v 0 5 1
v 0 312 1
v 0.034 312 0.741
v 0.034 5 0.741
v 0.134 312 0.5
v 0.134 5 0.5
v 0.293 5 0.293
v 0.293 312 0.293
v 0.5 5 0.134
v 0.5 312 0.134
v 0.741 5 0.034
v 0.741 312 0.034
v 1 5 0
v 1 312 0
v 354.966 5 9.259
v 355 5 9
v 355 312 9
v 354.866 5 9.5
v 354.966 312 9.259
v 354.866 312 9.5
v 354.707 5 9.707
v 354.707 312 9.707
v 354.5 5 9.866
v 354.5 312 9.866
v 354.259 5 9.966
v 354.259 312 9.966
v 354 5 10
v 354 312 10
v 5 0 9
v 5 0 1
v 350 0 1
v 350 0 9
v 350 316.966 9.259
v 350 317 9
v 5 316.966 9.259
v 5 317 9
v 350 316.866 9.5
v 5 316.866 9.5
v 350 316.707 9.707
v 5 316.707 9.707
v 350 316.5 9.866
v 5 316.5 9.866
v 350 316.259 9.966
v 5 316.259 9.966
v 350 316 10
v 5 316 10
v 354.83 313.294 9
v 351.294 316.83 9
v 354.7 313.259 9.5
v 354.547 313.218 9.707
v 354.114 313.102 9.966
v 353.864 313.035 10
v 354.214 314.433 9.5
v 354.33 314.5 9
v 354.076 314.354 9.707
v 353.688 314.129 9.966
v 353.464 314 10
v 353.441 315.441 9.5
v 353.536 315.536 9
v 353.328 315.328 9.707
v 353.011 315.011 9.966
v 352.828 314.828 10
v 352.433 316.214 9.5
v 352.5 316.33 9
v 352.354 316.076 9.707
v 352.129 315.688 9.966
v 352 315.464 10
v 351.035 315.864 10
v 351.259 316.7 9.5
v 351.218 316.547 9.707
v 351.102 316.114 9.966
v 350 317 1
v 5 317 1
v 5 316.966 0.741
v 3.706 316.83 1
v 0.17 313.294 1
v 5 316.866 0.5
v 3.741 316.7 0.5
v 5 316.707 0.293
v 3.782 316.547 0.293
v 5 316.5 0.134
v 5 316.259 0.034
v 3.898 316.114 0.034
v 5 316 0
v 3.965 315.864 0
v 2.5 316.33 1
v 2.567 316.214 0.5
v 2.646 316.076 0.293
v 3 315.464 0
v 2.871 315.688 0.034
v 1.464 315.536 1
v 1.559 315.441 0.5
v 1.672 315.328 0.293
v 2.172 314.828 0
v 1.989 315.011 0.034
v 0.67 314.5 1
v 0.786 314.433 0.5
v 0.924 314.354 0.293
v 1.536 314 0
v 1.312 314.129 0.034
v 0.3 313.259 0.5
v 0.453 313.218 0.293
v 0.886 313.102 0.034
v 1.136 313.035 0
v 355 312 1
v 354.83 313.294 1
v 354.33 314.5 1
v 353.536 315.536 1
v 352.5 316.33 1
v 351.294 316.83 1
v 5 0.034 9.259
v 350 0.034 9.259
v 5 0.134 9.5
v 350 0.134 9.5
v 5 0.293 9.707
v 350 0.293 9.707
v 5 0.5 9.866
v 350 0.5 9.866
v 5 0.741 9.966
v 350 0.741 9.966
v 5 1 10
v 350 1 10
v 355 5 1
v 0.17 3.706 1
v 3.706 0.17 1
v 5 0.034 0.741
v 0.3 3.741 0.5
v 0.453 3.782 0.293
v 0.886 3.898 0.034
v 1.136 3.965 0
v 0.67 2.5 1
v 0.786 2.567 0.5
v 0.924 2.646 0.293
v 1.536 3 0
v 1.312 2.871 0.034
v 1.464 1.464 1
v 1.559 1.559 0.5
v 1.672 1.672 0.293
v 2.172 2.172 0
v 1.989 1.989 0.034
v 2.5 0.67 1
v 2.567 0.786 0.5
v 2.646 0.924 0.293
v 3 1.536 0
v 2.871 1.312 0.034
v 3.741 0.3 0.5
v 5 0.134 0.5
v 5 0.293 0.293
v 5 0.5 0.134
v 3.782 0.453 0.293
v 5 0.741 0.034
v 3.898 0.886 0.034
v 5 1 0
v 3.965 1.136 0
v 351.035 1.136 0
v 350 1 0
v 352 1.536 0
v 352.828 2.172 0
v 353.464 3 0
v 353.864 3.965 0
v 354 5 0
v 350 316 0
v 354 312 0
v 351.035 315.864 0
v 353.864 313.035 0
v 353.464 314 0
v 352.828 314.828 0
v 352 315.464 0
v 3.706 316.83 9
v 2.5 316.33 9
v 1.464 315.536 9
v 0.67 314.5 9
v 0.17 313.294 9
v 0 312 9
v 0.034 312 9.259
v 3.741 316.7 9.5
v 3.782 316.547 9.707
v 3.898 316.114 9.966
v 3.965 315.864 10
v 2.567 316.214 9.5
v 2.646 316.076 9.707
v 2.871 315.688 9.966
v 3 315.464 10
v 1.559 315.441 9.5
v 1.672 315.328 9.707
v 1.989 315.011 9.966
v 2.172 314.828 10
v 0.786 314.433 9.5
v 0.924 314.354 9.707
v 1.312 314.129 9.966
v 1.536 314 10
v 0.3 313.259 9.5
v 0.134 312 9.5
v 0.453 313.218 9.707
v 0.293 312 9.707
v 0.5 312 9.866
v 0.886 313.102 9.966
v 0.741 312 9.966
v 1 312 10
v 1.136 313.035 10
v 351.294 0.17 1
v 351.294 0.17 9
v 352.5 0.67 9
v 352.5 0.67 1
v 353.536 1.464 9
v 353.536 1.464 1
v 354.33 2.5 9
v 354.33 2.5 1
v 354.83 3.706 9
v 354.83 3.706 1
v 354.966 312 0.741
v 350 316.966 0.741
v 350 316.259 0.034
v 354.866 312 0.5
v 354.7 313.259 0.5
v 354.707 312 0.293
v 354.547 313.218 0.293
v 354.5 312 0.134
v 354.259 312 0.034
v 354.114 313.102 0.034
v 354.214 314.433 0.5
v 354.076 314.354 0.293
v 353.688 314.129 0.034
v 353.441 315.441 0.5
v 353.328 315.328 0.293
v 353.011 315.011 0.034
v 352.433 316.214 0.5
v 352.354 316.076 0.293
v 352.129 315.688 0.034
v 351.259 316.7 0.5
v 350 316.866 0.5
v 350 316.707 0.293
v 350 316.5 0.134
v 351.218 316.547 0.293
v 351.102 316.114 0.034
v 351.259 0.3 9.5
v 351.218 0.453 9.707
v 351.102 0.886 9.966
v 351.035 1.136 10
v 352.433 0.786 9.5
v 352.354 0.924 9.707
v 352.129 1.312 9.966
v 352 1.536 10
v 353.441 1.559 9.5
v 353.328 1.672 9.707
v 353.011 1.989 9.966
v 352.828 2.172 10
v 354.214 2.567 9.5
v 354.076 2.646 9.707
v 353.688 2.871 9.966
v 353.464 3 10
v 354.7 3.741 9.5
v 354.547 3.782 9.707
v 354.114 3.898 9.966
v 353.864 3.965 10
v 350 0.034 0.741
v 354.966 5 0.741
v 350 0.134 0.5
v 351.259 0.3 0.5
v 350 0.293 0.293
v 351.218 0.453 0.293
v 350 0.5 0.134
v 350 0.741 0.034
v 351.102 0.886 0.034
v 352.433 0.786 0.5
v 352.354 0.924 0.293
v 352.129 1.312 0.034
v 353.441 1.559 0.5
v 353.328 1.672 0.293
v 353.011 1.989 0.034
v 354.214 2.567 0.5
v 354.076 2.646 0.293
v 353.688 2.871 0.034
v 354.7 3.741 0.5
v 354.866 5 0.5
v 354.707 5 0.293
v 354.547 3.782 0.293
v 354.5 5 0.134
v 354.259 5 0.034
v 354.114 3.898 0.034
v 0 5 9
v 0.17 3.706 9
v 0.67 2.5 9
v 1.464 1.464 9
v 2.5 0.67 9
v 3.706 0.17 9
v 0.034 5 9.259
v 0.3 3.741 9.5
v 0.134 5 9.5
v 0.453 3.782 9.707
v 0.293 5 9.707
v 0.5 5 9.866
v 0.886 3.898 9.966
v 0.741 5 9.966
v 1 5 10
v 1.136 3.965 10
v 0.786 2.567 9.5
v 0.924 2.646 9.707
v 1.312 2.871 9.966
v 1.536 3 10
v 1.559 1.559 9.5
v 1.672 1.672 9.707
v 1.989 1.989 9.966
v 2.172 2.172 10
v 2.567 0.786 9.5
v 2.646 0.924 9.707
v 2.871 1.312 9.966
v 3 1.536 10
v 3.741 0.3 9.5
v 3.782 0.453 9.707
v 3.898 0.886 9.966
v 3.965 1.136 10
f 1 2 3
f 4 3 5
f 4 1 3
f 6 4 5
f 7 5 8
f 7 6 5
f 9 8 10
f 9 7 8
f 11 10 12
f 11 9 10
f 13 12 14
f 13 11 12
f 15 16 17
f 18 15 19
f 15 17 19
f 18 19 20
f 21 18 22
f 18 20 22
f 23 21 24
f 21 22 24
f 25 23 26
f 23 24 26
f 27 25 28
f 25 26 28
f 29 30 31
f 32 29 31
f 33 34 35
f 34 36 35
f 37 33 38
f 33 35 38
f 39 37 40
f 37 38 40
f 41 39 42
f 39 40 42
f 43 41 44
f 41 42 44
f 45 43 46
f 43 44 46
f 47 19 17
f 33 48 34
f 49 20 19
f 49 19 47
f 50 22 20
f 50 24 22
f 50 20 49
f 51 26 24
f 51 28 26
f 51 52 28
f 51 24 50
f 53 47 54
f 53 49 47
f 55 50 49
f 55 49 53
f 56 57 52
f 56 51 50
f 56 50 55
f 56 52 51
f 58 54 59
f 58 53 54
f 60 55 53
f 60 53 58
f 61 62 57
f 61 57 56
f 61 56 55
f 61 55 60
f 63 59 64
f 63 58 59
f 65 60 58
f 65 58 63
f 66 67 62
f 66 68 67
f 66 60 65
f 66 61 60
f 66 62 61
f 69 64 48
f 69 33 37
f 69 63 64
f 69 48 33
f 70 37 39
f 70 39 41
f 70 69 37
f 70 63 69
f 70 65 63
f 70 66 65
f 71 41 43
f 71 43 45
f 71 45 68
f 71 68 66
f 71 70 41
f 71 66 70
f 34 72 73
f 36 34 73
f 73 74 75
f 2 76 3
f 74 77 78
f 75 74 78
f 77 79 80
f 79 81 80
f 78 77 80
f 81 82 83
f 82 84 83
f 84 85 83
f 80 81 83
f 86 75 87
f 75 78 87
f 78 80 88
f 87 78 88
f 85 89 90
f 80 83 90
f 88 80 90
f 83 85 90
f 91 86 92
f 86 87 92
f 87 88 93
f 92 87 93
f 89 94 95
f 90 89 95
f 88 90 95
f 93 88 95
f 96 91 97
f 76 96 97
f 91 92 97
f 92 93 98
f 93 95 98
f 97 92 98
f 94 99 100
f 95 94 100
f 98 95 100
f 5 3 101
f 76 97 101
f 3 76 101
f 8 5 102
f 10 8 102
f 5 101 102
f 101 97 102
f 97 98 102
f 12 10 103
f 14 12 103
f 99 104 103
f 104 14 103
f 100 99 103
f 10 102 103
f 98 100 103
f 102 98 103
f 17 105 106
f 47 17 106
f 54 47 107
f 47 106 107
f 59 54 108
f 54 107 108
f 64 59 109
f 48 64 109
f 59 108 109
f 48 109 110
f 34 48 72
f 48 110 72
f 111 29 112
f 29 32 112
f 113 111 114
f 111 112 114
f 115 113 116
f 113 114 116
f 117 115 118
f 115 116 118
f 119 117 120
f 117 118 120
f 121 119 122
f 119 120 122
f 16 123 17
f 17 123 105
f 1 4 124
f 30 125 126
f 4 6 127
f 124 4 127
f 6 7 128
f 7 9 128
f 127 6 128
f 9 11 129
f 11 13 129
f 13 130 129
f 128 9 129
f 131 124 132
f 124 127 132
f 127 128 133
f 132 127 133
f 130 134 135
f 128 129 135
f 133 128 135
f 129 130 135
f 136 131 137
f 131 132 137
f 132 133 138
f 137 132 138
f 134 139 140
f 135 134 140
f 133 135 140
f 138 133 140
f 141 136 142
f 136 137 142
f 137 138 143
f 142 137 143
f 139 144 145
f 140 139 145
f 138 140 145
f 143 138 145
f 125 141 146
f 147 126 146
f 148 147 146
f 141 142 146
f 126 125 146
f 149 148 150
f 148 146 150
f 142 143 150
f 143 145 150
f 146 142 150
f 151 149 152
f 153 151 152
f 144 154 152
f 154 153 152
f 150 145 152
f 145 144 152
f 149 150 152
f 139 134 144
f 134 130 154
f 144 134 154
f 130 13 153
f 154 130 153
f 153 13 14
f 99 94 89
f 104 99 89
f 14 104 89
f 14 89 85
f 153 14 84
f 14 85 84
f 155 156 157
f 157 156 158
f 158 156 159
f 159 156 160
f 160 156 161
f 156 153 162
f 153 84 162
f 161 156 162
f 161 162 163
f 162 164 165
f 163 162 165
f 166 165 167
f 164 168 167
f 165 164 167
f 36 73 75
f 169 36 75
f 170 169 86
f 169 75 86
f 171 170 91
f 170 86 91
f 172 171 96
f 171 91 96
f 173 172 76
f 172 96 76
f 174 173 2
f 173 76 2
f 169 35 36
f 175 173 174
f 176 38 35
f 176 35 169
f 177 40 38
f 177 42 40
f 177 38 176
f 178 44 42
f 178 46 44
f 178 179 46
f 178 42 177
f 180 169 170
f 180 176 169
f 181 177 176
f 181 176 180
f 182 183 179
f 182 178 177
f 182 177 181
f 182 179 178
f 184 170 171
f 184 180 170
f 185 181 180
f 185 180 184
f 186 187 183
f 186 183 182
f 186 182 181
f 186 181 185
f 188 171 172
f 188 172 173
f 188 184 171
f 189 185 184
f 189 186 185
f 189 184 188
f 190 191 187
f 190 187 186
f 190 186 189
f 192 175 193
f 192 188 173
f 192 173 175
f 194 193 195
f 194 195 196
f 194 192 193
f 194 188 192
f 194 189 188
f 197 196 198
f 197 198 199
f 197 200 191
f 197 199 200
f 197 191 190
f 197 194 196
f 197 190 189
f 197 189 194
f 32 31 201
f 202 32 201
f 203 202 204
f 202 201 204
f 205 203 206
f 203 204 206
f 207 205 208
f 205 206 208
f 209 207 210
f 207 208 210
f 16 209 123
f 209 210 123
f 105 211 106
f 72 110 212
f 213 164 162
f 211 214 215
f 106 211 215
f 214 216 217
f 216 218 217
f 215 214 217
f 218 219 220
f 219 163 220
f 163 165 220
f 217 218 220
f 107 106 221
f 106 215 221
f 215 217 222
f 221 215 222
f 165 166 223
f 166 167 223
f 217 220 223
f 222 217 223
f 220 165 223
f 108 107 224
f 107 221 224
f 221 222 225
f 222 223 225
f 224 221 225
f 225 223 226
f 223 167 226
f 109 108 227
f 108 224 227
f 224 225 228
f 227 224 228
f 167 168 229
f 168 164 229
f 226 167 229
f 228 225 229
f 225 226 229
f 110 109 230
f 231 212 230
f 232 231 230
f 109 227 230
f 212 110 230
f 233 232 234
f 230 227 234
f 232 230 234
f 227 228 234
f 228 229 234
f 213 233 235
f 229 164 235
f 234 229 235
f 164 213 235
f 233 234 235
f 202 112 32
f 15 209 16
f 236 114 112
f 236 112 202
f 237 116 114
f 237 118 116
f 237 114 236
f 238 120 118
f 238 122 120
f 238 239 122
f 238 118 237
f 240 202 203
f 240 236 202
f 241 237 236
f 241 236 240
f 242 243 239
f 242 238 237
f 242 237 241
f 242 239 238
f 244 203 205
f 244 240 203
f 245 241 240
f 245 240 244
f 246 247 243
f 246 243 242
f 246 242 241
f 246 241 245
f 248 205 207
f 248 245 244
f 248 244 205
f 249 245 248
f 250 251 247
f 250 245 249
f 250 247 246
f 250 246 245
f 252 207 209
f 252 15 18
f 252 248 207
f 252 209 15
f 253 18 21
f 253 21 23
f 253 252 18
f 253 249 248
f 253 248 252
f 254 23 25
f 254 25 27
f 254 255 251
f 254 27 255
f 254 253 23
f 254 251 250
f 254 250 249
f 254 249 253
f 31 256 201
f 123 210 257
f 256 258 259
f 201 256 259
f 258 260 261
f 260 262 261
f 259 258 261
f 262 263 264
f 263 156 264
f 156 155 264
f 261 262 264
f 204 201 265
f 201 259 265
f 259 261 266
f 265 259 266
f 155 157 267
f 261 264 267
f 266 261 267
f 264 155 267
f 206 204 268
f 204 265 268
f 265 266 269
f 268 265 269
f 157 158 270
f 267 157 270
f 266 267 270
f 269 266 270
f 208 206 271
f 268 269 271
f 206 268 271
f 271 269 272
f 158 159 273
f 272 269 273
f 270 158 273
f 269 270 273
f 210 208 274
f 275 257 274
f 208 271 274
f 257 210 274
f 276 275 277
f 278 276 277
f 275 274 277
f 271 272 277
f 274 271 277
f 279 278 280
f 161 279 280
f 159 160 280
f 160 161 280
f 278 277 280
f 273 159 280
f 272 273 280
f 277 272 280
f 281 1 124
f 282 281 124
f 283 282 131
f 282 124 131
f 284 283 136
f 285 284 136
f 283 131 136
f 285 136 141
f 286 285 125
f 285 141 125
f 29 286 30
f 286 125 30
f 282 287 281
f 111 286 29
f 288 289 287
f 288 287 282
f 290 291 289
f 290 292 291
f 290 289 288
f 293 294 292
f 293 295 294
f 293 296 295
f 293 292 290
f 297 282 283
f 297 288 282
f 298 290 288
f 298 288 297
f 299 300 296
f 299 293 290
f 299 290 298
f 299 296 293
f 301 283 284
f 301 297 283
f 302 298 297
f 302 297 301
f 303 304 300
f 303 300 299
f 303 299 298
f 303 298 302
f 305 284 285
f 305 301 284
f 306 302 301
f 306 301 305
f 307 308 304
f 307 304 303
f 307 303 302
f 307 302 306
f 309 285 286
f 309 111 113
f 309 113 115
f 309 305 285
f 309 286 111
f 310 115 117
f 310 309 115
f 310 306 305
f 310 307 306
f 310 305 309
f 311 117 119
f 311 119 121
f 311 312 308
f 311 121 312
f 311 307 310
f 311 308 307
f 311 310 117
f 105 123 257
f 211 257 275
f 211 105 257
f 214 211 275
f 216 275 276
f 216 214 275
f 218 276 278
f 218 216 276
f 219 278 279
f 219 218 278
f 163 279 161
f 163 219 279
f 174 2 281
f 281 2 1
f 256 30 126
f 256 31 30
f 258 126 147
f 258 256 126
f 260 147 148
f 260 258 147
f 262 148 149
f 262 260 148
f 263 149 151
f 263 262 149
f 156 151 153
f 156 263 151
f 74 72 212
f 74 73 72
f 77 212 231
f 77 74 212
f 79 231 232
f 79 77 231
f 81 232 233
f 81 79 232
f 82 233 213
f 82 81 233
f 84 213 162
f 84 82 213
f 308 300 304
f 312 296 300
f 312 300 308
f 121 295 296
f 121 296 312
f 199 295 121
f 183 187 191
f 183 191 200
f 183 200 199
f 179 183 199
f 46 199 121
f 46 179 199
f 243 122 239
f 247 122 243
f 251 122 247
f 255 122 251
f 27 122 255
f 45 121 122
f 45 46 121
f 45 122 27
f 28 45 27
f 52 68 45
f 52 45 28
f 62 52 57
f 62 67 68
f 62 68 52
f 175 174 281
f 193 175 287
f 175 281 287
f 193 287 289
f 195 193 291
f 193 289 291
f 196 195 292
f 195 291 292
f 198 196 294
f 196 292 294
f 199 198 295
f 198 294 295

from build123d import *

# Parameters (mm, degrees)
F1_DEPTH = 10
F2_R     = 1


with BuildPart() as f1:
    # F0 (on Top) → F1 (new body)
    with BuildSketch(Plane.XY):
        with BuildLine():
            ThreePointArc((0, 5), (1.464466, 1.464466), (5, 0))
            Line((5, 0), (350, 0))
            ThreePointArc((350, 0), (353.535534, 1.464466), (355, 5))
            Line((355, 5), (355, 312))
            ThreePointArc((355, 312), (353.535534, 315.535534), (350, 317))
            Line((350, 317), (5, 317))
            ThreePointArc((5, 317), (1.464466, 315.535534), (0, 312))
            Line((0, 312), (0, 5))
        make_face()
    extrude(amount=F1_DEPTH)

    # F2
    f2_edges = [f1.edges().sort_by_distance(p)[0] for p in [
        (0, 158.5, 10),
        (1.464466, 1.464466, 10),
        (177.5, 0, 10),
        (353.535534, 1.464466, 10),
        (355, 158.5, 10),
        (353.535534, 315.535534, 10),
        (177.5, 317, 10),
        (1.464466, 315.535534, 10),
        (0, 158.5, 0),
        (1.464466, 1.464466, 0),
        (177.5, 0, 0),
        (353.535534, 1.464466, 0),
        (355, 158.5, 0),
        (353.535534, 315.535534, 0),
        (177.5, 317, 0),
        (1.464466, 315.535534, 0),
    ]]
    fillet(f2_edges, radius=F2_R)


solid = f1.part
